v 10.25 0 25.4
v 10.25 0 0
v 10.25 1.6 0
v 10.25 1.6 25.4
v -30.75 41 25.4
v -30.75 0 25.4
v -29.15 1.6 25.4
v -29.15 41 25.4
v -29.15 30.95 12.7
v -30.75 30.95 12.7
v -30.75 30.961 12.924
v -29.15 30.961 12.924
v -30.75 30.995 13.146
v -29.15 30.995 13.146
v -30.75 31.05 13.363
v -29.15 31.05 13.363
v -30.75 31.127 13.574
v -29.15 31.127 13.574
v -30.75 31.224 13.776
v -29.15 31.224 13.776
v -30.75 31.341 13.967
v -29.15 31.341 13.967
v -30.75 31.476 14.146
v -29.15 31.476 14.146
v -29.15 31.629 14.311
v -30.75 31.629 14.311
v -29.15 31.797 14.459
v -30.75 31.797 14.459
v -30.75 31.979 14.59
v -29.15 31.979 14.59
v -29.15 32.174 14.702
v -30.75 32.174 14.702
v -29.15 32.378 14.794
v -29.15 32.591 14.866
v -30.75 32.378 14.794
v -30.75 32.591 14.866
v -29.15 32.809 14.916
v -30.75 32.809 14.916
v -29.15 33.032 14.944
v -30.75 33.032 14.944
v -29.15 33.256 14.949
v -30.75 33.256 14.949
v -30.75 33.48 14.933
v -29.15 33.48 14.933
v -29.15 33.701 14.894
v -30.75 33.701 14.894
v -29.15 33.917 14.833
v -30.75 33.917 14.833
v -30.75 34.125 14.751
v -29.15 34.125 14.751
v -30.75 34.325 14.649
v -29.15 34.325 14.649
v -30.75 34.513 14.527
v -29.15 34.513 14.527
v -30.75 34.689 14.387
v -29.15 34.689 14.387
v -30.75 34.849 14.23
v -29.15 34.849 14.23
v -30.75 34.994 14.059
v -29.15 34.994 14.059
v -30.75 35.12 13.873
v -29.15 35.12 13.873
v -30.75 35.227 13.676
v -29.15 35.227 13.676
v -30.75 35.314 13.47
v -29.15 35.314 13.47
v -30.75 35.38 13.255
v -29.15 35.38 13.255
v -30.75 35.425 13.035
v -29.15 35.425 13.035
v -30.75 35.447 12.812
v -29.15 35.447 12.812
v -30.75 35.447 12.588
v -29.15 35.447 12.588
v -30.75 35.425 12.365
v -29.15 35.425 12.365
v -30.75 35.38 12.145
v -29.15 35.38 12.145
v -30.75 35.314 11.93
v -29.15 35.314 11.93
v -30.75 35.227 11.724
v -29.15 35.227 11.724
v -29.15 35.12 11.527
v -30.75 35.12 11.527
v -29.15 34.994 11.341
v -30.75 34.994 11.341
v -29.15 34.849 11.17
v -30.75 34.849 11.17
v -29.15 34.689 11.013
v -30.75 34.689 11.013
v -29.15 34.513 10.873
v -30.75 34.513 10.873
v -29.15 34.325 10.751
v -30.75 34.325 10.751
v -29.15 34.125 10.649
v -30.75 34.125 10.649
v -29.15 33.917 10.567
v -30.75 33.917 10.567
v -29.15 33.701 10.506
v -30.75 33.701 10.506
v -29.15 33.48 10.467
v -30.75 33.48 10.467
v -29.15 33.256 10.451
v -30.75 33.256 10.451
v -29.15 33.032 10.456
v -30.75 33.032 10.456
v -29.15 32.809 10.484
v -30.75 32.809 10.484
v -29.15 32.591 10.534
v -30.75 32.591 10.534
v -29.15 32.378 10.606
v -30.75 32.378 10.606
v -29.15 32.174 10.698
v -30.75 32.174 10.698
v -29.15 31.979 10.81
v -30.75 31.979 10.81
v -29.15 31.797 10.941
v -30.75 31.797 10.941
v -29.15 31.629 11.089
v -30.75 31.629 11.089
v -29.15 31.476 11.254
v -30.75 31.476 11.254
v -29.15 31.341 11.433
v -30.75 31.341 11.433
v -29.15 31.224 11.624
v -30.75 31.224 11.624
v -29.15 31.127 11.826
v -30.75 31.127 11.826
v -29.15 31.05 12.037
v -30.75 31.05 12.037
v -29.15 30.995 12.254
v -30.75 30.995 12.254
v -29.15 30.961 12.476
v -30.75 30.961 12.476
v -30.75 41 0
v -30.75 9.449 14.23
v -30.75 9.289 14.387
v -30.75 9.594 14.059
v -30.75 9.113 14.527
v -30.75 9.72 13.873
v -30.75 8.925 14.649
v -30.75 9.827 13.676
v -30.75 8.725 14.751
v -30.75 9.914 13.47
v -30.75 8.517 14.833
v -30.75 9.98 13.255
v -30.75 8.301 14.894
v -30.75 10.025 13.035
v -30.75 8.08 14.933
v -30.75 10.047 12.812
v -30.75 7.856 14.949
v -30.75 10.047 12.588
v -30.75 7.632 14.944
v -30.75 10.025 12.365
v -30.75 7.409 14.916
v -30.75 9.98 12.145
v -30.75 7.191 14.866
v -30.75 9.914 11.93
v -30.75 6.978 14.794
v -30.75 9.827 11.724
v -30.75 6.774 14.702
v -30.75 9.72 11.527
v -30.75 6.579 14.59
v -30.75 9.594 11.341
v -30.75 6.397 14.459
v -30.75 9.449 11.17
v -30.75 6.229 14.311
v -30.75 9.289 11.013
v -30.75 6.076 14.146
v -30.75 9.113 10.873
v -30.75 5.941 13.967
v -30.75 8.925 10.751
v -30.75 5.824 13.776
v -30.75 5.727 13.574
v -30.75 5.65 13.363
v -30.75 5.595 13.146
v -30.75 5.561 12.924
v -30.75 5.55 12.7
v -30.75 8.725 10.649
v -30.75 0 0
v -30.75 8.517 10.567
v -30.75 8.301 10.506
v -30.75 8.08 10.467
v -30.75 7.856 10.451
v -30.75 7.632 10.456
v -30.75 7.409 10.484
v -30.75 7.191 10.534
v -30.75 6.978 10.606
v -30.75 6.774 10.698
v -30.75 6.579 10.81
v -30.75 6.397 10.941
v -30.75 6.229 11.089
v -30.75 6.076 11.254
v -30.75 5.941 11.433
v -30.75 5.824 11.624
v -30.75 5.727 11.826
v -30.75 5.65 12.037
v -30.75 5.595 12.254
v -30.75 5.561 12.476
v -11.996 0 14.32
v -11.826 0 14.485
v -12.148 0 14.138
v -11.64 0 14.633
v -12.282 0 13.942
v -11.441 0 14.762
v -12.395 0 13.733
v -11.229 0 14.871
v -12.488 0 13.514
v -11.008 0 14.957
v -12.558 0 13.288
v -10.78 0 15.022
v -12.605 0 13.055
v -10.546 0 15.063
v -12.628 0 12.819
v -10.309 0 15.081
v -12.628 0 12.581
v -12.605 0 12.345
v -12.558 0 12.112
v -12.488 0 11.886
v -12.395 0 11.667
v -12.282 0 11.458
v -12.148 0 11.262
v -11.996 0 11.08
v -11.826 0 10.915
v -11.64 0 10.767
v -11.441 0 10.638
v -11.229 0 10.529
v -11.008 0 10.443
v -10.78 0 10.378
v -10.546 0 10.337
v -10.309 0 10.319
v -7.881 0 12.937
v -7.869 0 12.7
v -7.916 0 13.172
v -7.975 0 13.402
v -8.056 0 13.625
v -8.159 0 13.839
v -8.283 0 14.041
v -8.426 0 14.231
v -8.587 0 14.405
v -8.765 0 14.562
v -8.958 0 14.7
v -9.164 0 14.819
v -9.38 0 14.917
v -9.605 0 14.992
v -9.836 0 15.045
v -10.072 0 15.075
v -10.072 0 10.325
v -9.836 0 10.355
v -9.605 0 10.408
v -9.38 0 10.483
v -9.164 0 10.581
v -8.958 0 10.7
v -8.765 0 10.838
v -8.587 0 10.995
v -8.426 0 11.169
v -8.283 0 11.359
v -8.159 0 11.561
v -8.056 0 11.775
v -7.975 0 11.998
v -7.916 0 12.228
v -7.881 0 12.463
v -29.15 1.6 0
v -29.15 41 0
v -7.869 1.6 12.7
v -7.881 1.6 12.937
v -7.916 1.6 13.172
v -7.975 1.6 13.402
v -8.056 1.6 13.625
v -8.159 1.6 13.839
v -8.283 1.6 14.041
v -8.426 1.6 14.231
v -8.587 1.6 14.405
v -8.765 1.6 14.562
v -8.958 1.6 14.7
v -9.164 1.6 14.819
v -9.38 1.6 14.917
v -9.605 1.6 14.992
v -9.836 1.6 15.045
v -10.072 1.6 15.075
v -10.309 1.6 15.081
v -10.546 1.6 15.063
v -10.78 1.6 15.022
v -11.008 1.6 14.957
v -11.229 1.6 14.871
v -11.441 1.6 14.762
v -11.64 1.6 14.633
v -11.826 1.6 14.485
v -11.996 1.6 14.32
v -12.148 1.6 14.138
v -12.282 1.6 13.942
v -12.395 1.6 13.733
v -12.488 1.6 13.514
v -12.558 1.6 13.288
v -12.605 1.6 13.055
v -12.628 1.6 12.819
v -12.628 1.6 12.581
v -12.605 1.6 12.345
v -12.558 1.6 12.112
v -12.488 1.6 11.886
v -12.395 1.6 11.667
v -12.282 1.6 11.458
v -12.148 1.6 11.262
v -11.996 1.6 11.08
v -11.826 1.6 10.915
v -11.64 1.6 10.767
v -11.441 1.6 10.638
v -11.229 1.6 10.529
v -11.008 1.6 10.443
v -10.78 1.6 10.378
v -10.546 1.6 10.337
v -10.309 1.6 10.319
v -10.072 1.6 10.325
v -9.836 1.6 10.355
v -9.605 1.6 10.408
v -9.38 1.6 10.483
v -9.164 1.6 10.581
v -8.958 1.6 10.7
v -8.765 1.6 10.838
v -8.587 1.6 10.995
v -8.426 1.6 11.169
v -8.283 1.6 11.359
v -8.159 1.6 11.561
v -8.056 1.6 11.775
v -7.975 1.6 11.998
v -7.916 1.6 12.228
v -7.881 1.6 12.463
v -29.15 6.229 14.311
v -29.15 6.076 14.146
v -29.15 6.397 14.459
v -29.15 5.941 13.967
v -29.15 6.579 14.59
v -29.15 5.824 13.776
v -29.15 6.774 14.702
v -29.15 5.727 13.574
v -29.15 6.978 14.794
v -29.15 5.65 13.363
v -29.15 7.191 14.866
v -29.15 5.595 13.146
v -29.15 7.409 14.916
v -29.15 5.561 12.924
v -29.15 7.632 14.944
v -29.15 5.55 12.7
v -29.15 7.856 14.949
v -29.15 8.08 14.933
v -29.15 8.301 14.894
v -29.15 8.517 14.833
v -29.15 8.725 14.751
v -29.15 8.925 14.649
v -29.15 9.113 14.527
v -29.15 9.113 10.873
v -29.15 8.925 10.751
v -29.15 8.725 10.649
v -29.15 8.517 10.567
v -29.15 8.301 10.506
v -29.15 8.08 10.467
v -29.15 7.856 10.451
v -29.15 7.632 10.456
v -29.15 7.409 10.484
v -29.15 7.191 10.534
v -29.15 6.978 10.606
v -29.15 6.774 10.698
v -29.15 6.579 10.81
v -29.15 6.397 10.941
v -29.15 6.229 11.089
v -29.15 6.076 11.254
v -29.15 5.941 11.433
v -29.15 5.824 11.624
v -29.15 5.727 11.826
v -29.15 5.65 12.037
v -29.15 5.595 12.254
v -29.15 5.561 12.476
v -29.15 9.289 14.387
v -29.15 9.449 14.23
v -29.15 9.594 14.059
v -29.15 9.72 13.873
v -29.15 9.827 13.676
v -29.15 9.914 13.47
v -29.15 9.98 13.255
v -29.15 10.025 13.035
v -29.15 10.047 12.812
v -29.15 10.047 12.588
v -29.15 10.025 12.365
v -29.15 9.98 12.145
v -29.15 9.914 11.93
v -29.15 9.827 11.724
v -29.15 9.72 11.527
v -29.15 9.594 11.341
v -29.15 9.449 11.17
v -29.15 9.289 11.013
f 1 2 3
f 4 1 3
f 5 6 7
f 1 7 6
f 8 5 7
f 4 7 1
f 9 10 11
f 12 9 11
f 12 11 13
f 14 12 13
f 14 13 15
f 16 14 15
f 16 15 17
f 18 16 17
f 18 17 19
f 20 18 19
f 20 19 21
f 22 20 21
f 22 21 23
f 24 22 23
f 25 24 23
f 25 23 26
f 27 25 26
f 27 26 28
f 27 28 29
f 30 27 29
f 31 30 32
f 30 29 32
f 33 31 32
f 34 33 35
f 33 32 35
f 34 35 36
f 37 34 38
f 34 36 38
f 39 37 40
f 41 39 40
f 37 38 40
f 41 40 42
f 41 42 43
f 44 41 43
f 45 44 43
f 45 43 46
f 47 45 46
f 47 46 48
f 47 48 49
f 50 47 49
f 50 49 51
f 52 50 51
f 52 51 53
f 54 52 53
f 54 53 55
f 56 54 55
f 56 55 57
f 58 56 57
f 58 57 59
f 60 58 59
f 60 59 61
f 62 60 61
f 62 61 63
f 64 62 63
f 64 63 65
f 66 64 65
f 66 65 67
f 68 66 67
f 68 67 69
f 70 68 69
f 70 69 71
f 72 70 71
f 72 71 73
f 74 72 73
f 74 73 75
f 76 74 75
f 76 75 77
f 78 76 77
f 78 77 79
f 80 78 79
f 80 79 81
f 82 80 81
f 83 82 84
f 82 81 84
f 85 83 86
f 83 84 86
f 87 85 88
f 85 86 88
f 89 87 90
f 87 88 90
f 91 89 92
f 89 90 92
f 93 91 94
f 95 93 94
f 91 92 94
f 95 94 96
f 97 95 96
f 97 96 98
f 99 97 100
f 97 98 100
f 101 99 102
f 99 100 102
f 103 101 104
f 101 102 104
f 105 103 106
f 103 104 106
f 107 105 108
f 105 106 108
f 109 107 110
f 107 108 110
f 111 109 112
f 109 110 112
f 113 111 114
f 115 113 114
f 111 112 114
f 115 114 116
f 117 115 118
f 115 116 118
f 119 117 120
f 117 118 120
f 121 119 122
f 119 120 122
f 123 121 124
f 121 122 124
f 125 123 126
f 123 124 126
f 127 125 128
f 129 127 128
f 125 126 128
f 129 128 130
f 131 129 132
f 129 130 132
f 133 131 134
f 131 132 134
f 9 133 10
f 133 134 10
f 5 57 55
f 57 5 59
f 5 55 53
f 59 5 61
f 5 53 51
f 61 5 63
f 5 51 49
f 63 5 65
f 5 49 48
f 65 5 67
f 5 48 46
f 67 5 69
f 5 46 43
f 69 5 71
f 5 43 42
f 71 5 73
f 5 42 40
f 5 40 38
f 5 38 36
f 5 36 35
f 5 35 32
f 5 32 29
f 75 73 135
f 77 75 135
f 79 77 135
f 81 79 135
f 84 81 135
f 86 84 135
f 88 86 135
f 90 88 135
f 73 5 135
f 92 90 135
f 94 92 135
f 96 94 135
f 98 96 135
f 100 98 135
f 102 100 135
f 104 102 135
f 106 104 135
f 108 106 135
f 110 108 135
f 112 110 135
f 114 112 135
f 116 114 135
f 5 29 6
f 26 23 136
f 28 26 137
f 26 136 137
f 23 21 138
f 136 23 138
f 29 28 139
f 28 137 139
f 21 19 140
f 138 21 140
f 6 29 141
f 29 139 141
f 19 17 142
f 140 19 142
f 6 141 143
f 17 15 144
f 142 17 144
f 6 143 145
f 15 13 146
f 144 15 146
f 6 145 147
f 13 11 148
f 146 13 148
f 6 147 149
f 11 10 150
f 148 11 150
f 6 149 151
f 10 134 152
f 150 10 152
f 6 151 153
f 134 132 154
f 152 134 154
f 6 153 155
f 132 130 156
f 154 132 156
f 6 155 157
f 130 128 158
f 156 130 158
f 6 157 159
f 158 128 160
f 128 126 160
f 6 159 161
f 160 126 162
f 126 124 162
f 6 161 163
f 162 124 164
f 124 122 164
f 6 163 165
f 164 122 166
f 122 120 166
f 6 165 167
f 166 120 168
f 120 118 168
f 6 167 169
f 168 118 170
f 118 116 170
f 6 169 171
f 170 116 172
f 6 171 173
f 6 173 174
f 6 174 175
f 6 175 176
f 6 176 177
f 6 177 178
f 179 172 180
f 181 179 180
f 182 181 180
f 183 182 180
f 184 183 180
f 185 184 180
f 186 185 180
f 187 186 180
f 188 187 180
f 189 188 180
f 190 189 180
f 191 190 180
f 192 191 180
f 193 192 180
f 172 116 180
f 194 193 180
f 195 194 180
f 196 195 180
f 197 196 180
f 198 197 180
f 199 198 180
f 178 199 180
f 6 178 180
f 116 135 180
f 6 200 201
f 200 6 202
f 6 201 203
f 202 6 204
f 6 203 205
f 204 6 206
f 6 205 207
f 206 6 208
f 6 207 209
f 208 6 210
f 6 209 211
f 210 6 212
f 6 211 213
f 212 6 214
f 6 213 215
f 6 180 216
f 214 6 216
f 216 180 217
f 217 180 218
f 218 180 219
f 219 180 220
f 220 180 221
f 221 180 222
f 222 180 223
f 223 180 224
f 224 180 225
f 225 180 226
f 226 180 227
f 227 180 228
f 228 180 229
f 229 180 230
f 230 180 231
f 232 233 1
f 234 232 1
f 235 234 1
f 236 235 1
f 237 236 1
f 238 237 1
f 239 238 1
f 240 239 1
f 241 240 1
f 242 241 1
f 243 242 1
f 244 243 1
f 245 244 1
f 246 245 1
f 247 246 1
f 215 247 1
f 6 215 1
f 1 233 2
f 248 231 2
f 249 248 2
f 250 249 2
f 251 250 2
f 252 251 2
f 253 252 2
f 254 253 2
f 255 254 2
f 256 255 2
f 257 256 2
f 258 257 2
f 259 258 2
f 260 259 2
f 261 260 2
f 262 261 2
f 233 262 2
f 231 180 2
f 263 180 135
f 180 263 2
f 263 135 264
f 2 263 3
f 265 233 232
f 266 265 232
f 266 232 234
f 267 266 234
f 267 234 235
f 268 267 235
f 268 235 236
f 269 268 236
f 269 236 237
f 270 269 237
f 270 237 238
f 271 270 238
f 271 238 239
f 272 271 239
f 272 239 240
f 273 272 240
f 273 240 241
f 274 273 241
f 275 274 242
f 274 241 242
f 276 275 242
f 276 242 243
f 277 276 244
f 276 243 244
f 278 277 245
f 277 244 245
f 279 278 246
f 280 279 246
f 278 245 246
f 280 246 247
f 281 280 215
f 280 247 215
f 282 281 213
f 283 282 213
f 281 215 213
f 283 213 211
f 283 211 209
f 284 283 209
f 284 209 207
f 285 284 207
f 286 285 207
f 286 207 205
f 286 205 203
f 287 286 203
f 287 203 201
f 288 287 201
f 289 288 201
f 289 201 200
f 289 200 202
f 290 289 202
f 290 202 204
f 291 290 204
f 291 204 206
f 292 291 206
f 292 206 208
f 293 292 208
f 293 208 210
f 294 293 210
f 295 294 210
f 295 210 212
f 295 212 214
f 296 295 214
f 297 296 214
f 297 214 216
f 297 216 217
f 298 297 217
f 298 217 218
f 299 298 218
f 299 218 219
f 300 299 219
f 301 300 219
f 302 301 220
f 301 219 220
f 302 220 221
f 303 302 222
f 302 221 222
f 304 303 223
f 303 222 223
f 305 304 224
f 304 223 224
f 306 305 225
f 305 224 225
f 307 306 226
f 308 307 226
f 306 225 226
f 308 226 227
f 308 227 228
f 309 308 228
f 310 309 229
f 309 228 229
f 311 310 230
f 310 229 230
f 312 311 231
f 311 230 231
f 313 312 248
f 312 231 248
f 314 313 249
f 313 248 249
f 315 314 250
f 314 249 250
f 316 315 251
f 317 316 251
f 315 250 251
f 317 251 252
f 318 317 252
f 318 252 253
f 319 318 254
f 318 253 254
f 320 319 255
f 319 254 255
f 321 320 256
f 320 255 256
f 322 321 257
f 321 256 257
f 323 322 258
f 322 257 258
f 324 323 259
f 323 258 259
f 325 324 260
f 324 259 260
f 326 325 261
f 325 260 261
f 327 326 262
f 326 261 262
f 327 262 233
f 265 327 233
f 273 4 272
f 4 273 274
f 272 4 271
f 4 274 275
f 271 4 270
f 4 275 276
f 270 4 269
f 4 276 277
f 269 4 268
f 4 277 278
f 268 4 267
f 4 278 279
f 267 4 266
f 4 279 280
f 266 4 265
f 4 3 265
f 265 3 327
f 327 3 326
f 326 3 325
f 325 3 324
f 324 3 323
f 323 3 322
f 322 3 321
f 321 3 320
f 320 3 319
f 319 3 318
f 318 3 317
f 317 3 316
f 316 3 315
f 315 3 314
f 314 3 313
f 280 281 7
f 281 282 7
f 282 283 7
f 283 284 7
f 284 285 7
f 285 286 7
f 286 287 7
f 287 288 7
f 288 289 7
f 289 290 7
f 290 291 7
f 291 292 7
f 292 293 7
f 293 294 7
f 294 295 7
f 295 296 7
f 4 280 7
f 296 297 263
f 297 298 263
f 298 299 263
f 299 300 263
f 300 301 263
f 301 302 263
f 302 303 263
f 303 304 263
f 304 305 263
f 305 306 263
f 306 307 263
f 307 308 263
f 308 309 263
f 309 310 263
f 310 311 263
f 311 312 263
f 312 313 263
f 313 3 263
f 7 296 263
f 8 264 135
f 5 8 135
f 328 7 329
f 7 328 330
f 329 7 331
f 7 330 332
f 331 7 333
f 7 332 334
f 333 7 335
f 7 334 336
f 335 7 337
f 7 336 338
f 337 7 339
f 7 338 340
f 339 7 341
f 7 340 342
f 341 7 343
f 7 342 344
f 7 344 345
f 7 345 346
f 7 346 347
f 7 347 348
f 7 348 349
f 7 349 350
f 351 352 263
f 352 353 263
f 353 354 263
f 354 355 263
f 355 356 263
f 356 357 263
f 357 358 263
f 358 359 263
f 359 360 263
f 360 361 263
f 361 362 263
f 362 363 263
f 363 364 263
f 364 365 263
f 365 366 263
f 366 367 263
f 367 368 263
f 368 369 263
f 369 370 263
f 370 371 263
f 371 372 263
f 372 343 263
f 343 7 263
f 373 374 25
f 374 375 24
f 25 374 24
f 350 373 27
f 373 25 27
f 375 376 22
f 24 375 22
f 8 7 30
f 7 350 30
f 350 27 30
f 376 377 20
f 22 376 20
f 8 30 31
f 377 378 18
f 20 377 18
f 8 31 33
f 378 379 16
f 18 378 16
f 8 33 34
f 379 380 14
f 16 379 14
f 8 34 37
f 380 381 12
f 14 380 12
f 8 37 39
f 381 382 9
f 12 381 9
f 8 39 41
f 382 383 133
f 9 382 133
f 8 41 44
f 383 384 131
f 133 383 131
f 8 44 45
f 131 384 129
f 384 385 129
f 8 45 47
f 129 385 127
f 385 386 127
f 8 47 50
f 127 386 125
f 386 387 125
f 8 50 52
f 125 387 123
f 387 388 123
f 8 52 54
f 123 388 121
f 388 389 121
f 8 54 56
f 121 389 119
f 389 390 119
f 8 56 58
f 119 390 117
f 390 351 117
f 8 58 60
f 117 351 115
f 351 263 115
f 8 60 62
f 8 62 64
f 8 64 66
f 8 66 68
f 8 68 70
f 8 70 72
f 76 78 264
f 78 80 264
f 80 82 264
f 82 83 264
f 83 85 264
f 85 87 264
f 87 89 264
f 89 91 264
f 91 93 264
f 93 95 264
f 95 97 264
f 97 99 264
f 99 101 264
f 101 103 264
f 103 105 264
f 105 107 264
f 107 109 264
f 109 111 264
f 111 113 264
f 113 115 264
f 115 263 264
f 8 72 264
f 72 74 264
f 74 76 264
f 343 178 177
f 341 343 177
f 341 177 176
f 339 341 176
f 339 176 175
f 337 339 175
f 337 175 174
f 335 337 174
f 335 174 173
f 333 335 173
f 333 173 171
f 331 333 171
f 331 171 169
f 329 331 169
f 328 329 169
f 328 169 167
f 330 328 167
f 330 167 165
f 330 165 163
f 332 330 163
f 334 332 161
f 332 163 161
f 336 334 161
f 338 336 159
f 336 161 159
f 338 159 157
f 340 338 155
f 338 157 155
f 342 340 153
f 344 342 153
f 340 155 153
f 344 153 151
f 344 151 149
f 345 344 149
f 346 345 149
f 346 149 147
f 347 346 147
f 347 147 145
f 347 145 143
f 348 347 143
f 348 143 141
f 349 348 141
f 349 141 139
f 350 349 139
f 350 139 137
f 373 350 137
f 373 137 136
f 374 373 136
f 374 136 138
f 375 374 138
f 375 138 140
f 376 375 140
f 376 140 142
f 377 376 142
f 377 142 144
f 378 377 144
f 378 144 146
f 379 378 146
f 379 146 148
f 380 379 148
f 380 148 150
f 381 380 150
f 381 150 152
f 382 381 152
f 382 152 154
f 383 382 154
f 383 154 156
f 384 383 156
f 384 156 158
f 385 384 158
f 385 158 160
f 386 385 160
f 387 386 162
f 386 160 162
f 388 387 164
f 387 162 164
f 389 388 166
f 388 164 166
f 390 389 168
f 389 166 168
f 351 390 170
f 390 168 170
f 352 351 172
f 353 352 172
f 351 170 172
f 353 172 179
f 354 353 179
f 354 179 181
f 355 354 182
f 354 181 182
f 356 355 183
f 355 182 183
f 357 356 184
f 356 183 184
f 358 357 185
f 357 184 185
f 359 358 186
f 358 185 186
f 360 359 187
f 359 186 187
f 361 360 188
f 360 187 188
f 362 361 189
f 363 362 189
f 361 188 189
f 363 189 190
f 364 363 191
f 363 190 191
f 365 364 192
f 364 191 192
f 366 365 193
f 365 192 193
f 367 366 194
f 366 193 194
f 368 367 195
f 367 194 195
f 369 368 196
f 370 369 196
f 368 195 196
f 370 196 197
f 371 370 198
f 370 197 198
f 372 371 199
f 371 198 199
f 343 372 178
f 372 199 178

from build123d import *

# Parameters (mm, degrees)
F1_DEPTH = 25.4
F2_R     = 2.25
F3_DEPTH = 41.001
F4_R     = 2.38125
F5_DEPTH = 41.001


with BuildPart() as f1:
    # F0 (on Top) → F1 (new body)
    with BuildSketch(Plane.XY):
        Polygon((-29.149991, 41), (-30.749991, 41), (-30.749991, 0), (10.250009, 0), (10.250009, 1.6), (-29.149991, 1.6), align=None)
    extrude(amount=F1_DEPTH)

    # F2 (on face) → F3 (cut, through all)
    with BuildSketch(Plane(origin=(-30.749991, 0, 0), x_dir=(0, -1, 0), z_dir=(-1, 0, 0))):
        with Locations((-33.2, 12.7)):
            Circle(F2_R)
        with Locations((-7.8, 12.7)):
            Circle(F2_R)
    extrude(amount=-F3_DEPTH, mode=Mode.SUBTRACT)

    # F4 (on face) → F5 (cut, through all)
    with BuildSketch(Plane.XZ):
        with Locations((-10.249991, 12.7)):
            Circle(F4_R)
    extrude(amount=-F5_DEPTH, mode=Mode.SUBTRACT)


solid = f1.part
